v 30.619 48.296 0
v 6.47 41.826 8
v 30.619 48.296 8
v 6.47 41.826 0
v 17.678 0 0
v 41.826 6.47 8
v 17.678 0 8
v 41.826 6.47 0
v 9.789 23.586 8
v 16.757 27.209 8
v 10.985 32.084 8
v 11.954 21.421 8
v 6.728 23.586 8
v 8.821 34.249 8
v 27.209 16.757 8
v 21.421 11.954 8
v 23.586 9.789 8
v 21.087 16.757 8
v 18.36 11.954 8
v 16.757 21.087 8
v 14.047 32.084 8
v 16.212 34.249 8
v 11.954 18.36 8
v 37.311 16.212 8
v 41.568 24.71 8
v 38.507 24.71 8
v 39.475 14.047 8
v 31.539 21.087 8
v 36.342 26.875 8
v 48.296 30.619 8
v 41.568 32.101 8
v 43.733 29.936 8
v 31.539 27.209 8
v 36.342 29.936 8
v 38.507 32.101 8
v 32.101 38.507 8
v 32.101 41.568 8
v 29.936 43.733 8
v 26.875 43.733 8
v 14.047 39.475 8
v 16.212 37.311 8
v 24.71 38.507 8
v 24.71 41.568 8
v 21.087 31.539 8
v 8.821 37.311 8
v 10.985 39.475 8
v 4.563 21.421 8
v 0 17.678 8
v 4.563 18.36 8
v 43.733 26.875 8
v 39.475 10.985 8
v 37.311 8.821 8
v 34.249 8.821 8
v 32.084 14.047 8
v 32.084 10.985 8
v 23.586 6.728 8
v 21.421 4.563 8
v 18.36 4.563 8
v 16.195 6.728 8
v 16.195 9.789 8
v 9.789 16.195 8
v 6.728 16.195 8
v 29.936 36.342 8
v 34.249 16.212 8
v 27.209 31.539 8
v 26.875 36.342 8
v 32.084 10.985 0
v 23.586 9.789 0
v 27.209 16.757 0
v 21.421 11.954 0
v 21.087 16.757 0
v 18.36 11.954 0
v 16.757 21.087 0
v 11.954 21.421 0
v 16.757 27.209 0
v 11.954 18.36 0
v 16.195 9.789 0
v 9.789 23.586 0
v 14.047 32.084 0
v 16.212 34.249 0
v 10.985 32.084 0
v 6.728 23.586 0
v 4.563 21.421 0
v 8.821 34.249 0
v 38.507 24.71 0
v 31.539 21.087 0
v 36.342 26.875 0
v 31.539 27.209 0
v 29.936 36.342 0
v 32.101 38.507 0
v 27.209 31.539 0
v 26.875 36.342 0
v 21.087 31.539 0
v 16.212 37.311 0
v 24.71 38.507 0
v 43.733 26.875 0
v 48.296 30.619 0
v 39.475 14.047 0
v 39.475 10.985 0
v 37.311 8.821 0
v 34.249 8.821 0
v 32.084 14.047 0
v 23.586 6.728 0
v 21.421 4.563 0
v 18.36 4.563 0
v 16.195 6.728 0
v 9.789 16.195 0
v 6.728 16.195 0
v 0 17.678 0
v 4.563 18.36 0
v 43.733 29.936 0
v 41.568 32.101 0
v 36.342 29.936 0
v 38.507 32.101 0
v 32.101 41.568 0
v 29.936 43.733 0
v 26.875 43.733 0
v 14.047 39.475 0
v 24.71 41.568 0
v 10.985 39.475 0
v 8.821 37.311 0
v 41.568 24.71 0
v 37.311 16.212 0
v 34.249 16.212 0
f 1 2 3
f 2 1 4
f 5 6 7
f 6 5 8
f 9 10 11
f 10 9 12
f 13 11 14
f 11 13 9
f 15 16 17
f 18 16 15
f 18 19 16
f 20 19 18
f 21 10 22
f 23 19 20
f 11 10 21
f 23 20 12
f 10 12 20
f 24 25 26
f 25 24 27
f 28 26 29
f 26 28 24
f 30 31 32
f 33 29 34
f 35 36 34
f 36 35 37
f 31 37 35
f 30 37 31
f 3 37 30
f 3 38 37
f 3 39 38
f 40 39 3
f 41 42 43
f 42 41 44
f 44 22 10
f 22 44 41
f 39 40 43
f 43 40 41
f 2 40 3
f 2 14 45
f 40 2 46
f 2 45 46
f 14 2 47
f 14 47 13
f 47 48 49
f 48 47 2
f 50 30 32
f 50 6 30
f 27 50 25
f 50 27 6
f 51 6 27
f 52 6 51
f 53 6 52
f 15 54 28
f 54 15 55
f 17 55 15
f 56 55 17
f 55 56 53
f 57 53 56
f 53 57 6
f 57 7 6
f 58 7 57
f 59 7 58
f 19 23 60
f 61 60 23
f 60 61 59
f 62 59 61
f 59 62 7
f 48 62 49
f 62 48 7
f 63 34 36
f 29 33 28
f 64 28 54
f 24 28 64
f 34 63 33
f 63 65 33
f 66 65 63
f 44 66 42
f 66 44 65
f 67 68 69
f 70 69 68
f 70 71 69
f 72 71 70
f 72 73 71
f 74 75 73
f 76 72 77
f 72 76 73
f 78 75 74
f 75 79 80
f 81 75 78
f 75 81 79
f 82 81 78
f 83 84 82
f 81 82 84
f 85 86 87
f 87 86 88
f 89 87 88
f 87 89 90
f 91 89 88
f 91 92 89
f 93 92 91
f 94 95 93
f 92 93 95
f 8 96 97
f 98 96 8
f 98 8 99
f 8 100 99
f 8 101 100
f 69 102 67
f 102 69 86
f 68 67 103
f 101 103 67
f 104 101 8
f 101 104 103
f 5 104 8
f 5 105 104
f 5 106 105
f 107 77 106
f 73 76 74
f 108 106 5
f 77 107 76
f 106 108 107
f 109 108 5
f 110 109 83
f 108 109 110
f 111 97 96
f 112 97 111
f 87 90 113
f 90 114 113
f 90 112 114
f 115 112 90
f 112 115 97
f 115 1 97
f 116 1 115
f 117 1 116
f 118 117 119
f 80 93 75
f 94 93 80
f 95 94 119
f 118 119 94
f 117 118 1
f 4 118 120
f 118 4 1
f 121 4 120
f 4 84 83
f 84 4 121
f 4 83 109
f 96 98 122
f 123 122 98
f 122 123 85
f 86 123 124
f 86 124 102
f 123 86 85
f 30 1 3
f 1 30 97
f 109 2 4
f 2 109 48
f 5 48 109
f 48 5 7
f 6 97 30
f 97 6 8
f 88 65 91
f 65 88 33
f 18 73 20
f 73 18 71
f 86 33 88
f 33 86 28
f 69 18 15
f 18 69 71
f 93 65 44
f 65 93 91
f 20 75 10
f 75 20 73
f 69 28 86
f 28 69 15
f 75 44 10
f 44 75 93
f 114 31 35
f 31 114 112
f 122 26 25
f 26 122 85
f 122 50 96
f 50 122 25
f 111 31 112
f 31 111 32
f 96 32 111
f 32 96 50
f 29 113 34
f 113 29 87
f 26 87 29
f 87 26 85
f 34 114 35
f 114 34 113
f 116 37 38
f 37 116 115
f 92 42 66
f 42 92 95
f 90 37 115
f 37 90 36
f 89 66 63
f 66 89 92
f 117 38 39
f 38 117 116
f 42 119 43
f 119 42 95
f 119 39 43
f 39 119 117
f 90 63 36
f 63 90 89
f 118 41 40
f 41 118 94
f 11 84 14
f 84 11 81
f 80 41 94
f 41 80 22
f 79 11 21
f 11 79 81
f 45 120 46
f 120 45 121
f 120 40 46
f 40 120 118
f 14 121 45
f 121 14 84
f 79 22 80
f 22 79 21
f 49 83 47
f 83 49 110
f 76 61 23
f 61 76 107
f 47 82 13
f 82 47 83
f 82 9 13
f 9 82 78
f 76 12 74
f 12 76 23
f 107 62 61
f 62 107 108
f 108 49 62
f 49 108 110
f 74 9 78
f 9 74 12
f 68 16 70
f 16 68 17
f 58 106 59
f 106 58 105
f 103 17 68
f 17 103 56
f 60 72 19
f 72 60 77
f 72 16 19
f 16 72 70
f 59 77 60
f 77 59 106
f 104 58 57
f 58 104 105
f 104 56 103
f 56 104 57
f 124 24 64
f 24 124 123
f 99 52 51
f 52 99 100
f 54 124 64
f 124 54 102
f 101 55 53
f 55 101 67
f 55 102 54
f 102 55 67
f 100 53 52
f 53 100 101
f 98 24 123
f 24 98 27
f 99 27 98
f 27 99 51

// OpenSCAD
$fn = 32;

// ----------------------------------------------------------------------
// Polygon plate: 6-gon R25, 6 bolt windows
// ----------------------------------------------------------------------

// --- parameters (mm) ---
sides = 6;                // number of polygon sides
plate_r = 25;             // circumscribed radius of the polygon
bore_r = 8;               // centre bore radius
bolts = 6;                // number of bolt windows
ring_r = 16.45;           // bolt-circle radius
bolt_r = 4;               // bolt window radius
plate_t = 8;              // plate thickness, Z (extrusion height)

plate_d = 2 * plate_r;  // circumscribed diameter
bore_d = 2 * bore_r;  // centre bore diameter
bolt_d = 2 * bolt_r;  // bolt window diameter
ring_d = 2 * ring_r;  // bolt-circle diameter

profile = [[48.296, 30.619], [30.619, 48.296], [6.47, 41.826], [0, 17.678], [17.678, 0], [41.826, 6.47]];  // primary outline, 6 points, counter clockwise
void_1 = [[31.539, 27.209], [27.209, 31.539], [21.087, 31.539], [16.757, 27.209], [16.757, 21.087], [21.087, 16.757], [27.209, 16.757], [31.539, 21.087]];  // centre bore, 8 points
void_2 = [[43.733, 29.936], [41.568, 32.101], [38.507, 32.101], [36.342, 29.936], [36.342, 26.875], [38.507, 24.71], [41.568, 24.71], [43.733, 26.875]];  // bolt window 1, 8 points
void_3 = [[32.101, 41.568], [29.936, 43.733], [26.875, 43.733], [24.71, 41.568], [24.71, 38.507], [26.875, 36.342], [29.936, 36.342], [32.101, 38.507]];  // bolt window 2, 8 points
void_4 = [[16.212, 37.311], [14.047, 39.475], [10.985, 39.475], [8.821, 37.311], [8.821, 34.249], [10.985, 32.084], [14.047, 32.084], [16.212, 34.249]];  // bolt window 3, 8 points
void_5 = [[11.954, 21.421], [9.789, 23.586], [6.728, 23.586], [4.563, 21.421], [4.563, 18.36], [6.728, 16.195], [9.789, 16.195], [11.954, 18.36]];  // bolt window 4, 8 points
void_6 = [[23.586, 9.789], [21.421, 11.954], [18.36, 11.954], [16.195, 9.789], [16.195, 6.728], [18.36, 4.563], [21.421, 4.563], [23.586, 6.728]];  // bolt window 5, 8 points
void_7 = [[39.475, 14.047], [37.311, 16.212], [34.249, 16.212], [32.084, 14.047], [32.084, 10.985], [34.249, 8.821], [37.311, 8.821], [39.475, 10.985]];  // bolt window 6, 8 points

// --- the one profile operation ---
difference() {
  linear_extrude(height = plate_t) polygon(points = profile);
  translate([0, 0, -1])
    linear_extrude(height = plate_t + 2) polygon(points = void_1);
  translate([0, 0, -1])
    linear_extrude(height = plate_t + 2) polygon(points = void_2);
  translate([0, 0, -1])
    linear_extrude(height = plate_t + 2) polygon(points = void_3);
  translate([0, 0, -1])
    linear_extrude(height = plate_t + 2) polygon(points = void_4);
  translate([0, 0, -1])
    linear_extrude(height = plate_t + 2) polygon(points = void_5);
  translate([0, 0, -1])
    linear_extrude(height = plate_t + 2) polygon(points = void_6);
  translate([0, 0, -1])
    linear_extrude(height = plate_t + 2) polygon(points = void_7);
}
